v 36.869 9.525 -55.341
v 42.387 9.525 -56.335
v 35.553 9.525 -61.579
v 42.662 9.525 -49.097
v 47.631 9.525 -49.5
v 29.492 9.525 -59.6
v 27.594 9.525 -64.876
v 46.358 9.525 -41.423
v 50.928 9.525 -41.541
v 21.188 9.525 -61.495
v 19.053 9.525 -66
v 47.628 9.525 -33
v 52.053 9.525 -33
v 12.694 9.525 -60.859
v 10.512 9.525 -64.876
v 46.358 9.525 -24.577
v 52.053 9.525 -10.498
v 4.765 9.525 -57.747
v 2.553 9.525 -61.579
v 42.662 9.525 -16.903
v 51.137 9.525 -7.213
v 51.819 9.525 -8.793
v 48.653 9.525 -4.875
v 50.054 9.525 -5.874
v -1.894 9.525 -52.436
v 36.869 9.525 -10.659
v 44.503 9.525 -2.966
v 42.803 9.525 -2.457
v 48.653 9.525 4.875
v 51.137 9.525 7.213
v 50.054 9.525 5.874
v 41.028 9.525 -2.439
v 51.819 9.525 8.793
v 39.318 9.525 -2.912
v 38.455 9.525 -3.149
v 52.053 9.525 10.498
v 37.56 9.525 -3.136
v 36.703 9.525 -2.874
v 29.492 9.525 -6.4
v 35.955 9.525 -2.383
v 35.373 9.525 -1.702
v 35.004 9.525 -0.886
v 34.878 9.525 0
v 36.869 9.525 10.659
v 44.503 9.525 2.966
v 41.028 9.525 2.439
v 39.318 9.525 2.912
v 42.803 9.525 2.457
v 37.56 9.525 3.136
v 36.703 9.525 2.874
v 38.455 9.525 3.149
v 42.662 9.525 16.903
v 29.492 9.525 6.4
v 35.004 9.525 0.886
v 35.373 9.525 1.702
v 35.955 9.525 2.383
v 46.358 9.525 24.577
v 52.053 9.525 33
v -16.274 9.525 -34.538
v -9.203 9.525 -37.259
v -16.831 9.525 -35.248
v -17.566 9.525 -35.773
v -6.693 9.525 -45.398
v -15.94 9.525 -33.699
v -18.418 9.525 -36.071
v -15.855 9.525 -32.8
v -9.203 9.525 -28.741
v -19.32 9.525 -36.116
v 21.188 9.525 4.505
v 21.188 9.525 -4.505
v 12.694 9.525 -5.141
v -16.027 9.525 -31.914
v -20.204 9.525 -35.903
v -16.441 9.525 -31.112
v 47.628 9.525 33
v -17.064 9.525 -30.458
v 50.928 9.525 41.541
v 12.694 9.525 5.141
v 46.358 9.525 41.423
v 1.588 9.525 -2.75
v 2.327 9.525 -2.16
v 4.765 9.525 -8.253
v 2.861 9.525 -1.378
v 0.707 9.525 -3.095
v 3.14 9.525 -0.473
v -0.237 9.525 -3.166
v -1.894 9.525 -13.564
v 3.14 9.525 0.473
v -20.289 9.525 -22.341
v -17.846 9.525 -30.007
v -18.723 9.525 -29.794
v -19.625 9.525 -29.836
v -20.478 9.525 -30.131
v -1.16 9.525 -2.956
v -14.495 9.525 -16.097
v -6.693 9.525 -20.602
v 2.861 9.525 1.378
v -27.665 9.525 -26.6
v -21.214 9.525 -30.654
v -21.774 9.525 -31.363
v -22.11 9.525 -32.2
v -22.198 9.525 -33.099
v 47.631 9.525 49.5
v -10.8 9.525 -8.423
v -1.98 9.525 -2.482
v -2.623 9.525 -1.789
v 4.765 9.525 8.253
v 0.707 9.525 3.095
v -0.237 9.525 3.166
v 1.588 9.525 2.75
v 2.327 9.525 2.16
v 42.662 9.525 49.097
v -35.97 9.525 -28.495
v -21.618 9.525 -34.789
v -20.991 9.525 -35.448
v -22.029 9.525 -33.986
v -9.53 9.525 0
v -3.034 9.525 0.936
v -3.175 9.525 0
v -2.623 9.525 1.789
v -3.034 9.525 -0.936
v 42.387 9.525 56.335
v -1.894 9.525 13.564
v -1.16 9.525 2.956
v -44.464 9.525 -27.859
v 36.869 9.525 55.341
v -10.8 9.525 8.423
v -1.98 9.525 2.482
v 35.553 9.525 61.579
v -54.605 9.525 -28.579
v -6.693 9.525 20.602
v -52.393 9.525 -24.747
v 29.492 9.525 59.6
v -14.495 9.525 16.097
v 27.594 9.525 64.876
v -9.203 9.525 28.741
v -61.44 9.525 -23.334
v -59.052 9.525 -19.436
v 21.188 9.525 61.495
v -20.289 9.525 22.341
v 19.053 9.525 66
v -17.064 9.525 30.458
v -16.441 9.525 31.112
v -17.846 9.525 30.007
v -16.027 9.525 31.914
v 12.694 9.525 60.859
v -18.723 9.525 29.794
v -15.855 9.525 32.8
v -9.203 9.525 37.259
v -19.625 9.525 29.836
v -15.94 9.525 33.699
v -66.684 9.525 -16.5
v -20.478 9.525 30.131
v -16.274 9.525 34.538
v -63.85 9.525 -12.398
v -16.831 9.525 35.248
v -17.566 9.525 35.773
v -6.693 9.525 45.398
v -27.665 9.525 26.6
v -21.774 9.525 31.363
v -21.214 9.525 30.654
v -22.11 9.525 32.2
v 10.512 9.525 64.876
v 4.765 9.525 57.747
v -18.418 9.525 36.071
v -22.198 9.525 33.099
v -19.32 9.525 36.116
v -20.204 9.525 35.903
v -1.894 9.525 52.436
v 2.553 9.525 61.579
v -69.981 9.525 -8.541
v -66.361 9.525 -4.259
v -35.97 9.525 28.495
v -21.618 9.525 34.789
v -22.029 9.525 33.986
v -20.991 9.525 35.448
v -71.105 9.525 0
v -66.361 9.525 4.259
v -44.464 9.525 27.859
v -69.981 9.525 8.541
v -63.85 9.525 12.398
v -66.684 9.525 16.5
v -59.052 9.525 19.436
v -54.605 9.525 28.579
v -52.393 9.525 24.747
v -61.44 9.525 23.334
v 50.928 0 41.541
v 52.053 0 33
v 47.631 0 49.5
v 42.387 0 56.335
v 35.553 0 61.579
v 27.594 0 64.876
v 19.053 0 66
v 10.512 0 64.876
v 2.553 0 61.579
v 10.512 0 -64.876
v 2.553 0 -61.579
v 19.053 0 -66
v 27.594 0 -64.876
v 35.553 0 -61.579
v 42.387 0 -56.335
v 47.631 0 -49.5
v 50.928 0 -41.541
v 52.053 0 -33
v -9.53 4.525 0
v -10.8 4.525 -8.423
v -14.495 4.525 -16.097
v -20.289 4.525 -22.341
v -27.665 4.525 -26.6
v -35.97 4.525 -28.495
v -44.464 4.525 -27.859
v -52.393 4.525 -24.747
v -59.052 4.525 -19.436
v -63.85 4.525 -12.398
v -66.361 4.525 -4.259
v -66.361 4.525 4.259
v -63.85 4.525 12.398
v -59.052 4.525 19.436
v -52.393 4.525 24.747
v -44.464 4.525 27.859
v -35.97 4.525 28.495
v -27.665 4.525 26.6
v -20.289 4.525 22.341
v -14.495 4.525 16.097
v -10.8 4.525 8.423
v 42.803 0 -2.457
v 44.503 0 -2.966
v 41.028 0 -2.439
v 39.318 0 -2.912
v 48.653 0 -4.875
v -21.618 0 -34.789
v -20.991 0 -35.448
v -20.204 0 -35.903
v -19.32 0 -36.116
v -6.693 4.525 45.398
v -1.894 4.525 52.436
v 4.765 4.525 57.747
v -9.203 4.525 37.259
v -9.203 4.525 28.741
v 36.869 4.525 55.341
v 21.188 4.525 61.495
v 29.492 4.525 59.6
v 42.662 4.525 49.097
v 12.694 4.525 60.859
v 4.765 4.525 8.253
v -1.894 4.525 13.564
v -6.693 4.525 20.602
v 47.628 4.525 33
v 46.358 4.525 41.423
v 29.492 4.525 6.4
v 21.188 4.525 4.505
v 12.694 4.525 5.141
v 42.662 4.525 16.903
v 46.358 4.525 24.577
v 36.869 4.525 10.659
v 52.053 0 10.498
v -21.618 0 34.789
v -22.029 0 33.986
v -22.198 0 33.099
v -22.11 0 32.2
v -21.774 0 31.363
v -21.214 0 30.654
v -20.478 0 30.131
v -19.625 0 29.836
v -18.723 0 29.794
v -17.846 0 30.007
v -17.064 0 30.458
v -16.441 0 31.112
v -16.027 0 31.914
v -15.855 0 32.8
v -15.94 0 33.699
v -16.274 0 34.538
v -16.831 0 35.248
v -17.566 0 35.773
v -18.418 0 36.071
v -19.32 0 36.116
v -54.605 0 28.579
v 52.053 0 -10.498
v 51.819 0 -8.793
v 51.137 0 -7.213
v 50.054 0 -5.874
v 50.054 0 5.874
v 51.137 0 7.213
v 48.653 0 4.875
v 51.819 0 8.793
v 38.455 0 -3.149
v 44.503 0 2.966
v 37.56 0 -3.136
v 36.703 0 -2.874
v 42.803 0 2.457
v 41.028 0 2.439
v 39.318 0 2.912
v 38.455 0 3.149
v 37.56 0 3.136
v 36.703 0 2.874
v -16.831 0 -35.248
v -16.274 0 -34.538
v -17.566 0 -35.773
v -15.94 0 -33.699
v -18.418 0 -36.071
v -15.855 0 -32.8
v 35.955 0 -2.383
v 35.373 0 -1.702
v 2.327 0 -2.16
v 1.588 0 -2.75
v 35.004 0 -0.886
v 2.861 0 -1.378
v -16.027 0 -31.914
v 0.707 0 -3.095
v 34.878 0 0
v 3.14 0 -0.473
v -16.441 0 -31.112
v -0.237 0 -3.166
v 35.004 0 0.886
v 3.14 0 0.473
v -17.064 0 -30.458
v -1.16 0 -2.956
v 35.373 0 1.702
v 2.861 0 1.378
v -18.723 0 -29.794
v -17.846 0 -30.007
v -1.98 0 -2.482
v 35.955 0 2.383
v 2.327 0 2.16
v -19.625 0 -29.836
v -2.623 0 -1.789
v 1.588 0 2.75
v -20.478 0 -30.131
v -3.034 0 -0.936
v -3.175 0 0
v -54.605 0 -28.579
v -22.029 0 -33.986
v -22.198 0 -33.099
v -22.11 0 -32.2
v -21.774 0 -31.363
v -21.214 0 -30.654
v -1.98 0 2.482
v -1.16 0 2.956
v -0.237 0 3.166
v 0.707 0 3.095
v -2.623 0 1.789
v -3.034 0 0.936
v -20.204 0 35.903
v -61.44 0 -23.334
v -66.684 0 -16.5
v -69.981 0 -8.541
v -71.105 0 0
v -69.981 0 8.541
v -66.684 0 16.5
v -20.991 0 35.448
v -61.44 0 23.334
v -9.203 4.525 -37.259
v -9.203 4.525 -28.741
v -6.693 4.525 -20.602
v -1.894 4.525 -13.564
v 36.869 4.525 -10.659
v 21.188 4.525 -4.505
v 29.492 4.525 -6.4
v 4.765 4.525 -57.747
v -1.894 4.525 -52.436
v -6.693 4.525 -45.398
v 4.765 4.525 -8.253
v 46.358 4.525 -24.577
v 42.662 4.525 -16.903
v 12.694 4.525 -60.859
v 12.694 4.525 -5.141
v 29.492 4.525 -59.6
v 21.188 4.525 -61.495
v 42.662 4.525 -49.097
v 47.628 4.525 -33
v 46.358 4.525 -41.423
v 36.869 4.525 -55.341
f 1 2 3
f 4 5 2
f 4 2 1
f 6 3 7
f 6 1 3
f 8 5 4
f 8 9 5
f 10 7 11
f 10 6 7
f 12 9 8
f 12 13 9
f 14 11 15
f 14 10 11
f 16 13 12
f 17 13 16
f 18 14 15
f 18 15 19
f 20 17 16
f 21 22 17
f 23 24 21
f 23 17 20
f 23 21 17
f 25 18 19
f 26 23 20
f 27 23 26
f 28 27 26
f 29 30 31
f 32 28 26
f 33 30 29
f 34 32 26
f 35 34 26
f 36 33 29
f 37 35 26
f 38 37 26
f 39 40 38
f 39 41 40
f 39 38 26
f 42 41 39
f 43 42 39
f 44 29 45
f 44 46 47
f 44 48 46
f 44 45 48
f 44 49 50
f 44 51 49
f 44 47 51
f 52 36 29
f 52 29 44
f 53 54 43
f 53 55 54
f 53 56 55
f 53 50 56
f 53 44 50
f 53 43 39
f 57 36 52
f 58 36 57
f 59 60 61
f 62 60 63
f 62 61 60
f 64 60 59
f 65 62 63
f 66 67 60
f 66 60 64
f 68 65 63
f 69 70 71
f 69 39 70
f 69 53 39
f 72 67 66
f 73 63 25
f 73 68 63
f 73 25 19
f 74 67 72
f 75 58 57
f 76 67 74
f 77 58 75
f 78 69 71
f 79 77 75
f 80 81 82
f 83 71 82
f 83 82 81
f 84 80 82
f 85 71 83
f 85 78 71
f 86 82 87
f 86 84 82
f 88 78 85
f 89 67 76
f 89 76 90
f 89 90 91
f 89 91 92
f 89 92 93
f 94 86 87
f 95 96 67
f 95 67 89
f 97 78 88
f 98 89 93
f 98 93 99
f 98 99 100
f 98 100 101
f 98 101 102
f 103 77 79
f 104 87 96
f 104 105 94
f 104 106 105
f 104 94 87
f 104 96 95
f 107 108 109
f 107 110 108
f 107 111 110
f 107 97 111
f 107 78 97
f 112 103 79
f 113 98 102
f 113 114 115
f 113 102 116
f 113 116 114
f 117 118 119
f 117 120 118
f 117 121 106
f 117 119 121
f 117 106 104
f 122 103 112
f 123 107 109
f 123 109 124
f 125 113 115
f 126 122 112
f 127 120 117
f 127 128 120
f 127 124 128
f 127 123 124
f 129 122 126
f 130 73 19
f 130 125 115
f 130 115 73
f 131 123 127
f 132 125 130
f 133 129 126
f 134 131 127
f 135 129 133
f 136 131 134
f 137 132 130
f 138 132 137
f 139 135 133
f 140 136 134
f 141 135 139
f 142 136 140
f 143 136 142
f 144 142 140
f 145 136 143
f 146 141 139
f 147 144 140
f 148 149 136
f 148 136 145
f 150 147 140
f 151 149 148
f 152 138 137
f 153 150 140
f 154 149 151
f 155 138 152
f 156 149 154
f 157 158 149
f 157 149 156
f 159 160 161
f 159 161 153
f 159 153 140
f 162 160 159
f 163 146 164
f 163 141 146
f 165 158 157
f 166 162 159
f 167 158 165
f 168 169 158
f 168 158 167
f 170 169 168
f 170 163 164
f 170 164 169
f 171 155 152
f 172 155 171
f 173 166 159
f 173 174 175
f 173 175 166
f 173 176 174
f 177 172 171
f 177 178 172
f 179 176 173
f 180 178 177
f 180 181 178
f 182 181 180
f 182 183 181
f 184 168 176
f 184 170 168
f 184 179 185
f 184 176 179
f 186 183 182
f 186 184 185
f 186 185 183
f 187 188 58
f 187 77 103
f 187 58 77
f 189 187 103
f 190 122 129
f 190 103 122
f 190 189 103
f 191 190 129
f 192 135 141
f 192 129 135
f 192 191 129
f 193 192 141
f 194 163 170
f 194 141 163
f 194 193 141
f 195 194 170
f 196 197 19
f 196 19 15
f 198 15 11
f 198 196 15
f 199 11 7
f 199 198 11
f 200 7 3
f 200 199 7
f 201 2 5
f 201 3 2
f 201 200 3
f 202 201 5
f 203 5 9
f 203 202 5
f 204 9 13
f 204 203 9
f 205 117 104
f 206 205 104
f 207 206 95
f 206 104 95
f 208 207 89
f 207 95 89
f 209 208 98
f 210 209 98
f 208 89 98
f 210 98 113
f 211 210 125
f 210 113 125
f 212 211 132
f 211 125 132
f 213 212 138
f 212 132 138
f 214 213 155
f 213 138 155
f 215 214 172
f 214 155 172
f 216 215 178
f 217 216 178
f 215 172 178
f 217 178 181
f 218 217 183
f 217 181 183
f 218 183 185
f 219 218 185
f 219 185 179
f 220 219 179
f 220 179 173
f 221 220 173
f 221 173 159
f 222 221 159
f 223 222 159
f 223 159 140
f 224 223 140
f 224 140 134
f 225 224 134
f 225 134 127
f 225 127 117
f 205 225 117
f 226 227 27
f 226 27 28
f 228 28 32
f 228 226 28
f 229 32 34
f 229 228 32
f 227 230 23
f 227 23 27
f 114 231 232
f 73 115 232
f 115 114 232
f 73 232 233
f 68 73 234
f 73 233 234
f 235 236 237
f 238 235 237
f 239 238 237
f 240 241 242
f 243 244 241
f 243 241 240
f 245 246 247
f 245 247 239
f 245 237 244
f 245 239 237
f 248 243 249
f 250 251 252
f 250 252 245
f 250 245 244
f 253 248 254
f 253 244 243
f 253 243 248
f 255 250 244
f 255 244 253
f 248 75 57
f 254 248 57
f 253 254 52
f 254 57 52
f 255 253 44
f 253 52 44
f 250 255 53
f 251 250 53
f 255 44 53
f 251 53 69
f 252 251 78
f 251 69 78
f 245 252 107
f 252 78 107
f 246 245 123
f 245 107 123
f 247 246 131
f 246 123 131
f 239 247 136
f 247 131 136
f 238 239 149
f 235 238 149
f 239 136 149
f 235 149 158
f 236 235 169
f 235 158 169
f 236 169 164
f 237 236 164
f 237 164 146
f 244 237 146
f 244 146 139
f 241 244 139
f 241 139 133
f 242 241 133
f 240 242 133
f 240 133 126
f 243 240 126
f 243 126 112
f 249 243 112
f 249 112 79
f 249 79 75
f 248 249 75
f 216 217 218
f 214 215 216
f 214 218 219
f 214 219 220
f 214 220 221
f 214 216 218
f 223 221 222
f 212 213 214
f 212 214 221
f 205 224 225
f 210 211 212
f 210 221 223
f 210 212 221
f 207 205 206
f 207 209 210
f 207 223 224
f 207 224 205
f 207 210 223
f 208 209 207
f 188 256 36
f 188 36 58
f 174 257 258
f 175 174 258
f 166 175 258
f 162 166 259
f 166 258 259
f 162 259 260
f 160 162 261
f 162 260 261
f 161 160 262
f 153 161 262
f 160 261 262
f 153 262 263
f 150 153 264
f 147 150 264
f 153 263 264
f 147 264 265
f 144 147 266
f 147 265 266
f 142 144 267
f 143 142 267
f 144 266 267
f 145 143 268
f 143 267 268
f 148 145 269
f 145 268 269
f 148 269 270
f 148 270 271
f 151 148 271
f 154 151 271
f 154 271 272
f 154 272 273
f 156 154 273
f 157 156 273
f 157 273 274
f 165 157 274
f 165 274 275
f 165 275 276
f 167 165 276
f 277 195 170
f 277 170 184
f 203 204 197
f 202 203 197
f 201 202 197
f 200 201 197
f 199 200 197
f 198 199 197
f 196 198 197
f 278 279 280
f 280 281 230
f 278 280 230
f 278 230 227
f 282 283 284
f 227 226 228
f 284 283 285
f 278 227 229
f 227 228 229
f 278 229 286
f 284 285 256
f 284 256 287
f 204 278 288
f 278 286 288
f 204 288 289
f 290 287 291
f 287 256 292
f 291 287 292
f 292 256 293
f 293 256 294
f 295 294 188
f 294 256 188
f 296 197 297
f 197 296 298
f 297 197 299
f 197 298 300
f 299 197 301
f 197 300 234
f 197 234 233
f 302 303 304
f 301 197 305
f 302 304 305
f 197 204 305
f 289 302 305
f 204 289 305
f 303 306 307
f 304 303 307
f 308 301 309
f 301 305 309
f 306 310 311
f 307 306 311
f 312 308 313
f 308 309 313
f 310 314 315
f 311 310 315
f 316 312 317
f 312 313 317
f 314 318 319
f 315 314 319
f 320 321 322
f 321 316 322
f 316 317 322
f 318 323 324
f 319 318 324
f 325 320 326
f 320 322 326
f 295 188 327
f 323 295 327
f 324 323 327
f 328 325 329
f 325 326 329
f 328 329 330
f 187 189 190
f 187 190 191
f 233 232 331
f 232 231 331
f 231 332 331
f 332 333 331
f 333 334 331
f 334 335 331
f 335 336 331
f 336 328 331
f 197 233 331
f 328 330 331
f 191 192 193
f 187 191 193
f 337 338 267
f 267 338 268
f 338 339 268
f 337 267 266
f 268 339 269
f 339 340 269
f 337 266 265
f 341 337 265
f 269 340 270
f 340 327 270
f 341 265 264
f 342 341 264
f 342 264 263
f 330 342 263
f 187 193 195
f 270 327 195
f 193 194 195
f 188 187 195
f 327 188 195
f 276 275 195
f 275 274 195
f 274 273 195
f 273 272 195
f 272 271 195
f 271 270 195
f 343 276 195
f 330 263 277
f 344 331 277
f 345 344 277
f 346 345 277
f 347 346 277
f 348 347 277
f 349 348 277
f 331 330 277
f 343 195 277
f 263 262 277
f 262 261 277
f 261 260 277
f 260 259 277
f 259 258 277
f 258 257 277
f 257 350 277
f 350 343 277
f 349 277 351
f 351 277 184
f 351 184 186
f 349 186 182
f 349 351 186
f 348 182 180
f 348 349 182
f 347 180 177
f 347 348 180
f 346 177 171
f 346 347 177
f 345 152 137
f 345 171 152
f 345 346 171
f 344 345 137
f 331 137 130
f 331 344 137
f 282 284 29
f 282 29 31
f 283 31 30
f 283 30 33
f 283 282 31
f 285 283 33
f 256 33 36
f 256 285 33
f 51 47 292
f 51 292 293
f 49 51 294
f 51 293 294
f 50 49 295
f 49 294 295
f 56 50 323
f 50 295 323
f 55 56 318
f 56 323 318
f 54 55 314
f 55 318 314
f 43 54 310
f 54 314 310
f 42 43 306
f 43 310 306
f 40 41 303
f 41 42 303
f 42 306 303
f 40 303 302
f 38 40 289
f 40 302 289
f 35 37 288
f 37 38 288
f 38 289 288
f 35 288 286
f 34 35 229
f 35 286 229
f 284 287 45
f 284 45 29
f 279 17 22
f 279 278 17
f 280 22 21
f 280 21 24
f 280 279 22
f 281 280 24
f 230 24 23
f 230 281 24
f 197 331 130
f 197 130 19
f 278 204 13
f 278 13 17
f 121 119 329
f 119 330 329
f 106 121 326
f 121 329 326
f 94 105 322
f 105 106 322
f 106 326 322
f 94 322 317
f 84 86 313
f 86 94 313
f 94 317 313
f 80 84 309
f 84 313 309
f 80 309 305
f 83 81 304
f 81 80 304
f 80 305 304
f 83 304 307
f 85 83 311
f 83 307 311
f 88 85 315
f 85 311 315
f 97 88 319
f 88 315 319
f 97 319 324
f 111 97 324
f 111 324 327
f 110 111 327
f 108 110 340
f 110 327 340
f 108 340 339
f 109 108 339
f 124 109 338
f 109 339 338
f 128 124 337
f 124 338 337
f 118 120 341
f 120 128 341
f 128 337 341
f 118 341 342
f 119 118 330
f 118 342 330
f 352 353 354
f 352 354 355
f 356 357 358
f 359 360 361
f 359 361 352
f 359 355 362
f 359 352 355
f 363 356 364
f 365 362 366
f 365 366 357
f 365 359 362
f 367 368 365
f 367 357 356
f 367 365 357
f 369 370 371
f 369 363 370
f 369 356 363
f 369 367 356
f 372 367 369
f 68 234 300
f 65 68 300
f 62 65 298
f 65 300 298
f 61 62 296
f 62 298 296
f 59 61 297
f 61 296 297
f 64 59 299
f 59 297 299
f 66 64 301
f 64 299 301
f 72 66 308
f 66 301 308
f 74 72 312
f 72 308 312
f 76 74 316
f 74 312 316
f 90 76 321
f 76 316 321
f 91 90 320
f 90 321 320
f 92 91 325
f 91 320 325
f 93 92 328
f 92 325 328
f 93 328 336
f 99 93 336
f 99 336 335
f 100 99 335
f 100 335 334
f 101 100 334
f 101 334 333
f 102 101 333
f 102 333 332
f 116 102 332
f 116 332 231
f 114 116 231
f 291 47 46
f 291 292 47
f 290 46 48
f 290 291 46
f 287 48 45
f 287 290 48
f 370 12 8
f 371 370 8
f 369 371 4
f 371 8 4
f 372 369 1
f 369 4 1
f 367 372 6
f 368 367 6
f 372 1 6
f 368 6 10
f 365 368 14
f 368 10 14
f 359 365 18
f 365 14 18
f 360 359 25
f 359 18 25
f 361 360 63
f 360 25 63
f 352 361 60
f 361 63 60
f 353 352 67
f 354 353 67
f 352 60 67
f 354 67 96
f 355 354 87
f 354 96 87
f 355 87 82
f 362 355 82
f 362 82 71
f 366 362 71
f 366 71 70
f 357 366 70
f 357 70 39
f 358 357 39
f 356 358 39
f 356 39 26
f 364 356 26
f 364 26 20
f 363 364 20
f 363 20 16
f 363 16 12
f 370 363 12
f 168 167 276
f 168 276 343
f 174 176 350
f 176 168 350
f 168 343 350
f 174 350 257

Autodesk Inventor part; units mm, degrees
ref_plane "YZ Plane" through (0, 0, 0) normal (1, 0, 0) x (0, 1, 0)
ref_plane "XZ Plane" through (0, 0, 0) normal (0, 1, 0) x (-1, 0, 0)
ref_plane "XY Plane" through (0, 0, 0) normal (0, 0, 1) x (1, 0, 0)
sketch "Sketch1" plane through (0, 0, 0) normal (0, 1, 0) x (-1, 0, 0)
  line L0 (54.6051, -28.5788) -> (-2.5526, -61.5788)
  line L1 (-52.0526, -33) -> (-52.0526, 33)
  line L2 (-2.5526, 61.5788) -> (54.6051, 28.5788)
  circle A0 centre (38.1051, 0) radius 33 construction
  circle A1 centre (-19.0526, 33) radius 33 construction
  circle A2 centre (-19.0526, -33) radius 33 construction
  arc A3 (54.6051, -28.5788) -> (54.6051, 28.5788) centre (38.1051, 0) ccw
  arc A4 (-52.0526, -33) -> (-2.5526, -61.5788) centre (-19.0526, -33) ccw
  arc A5 (-2.5526, 61.5788) -> (-52.0526, 33) centre (-19.0526, 33) ccw
  circle A6 centre (0, 0) radius 3.175
  line L3 (-52.0526, -4.875) -> (-48.6526, -4.875)
  line L4 (-48.6526, -4.875) -> (-40.9371, -1.3266)
  line L5 (-40.9371, 1.3266) -> (-48.6526, 4.875)
  line L6 (-48.6526, 4.875) -> (-52.0526, 4.875)
  arc A7 (-40.9371, -1.3266) -> (-40.9371, 1.3266) centre (-38.0526, 0) ccw
  line L7 (-40.9371, -1.3266) -> (-38.0526, 0) construction
  line L8 (-38.0526, 0) -> (-40.9371, 1.3266) construction
  arc A8 (21.6175, -34.7893) -> (19.3197, -36.1159) centre (19.0263, -32.9545) ccw
  arc A9 (19.3197, 36.1159) -> (21.6175, 34.7893) centre (19.0263, 32.9545) ccw
  circle A10 centre (19.0263, 32.9545) radius 3.175
  circle A11 centre (19.0263, -32.9545) radius 3.175
  point P0 (-52.0526, 0)
  point P1 (-52.0526, 0)
  point P2 (21.6175, -34.7893)
  point P3 (21.6175, 34.7893)
  dimension "d1" = 66
  dimension "d14" = 6.35
  dimension "d15" = 9.75
  dimension "d16" = 3.4
  dimension "d18" = 10.6
  dimension "d20" = 6.35
  dimension "d23" = 360
extrude "Extrusion1" add sketch "Sketch1" along normal blind 9.525 contours L0 A4 L1 L3 L4 A7 L5 L6 A5 L2 A3
sketch "Sketch2" plane through (0, 9.525, 0) normal (0, 1, 0) x (1, 0, 0)
  circle A0 centre (19.0526, -33) radius 28.575
  circle A1 centre (-38.1051, 0) radius 28.575
  circle A2 centre (19.0526, 33) radius 28.575
  circle A3 centre (19.0526, 33) radius 33
  circle A4 centre (-38.1051, 0) radius 33
  circle A5 centre (19.0526, -33) radius 33
  line L0 (-54.6051, -28.5788) -> (2.5526, -61.5788) projected
  line L1 (2.5526, 61.5788) -> (-54.6051, 28.5788) projected
  line L2 (52.0526, -33) -> (52.0526, 33) projected
  point P0 (0, 0)
  point P1 (-99.3426, -2.7496)
  point P2 (47.2901, -87.408)
  point P3 (47.2901, 87.408)
  point P4 (-99.3426, 2.7496)
  point P5 (52.0526, -84.6584)
  point P6 (52.0526, 84.6584)
  dimension "d5" = 57.15
extrude "Extrusion2" cut sketch "Sketch2" against normal blind 5 contours A0 | A1 | A2
fillet "Fillet2" radius 6.35 4 edges at (52.0526, 4.7625, -4.875) (52.0526, 4.7625, 4.875) (40.9371, 4.7625, -1.3266) (40.9371, 4.7625, 1.3266)
properties part number "BOTTOM_PLATE_WEIGHTS_TREBUCHET" material "Wood (Birch)"
